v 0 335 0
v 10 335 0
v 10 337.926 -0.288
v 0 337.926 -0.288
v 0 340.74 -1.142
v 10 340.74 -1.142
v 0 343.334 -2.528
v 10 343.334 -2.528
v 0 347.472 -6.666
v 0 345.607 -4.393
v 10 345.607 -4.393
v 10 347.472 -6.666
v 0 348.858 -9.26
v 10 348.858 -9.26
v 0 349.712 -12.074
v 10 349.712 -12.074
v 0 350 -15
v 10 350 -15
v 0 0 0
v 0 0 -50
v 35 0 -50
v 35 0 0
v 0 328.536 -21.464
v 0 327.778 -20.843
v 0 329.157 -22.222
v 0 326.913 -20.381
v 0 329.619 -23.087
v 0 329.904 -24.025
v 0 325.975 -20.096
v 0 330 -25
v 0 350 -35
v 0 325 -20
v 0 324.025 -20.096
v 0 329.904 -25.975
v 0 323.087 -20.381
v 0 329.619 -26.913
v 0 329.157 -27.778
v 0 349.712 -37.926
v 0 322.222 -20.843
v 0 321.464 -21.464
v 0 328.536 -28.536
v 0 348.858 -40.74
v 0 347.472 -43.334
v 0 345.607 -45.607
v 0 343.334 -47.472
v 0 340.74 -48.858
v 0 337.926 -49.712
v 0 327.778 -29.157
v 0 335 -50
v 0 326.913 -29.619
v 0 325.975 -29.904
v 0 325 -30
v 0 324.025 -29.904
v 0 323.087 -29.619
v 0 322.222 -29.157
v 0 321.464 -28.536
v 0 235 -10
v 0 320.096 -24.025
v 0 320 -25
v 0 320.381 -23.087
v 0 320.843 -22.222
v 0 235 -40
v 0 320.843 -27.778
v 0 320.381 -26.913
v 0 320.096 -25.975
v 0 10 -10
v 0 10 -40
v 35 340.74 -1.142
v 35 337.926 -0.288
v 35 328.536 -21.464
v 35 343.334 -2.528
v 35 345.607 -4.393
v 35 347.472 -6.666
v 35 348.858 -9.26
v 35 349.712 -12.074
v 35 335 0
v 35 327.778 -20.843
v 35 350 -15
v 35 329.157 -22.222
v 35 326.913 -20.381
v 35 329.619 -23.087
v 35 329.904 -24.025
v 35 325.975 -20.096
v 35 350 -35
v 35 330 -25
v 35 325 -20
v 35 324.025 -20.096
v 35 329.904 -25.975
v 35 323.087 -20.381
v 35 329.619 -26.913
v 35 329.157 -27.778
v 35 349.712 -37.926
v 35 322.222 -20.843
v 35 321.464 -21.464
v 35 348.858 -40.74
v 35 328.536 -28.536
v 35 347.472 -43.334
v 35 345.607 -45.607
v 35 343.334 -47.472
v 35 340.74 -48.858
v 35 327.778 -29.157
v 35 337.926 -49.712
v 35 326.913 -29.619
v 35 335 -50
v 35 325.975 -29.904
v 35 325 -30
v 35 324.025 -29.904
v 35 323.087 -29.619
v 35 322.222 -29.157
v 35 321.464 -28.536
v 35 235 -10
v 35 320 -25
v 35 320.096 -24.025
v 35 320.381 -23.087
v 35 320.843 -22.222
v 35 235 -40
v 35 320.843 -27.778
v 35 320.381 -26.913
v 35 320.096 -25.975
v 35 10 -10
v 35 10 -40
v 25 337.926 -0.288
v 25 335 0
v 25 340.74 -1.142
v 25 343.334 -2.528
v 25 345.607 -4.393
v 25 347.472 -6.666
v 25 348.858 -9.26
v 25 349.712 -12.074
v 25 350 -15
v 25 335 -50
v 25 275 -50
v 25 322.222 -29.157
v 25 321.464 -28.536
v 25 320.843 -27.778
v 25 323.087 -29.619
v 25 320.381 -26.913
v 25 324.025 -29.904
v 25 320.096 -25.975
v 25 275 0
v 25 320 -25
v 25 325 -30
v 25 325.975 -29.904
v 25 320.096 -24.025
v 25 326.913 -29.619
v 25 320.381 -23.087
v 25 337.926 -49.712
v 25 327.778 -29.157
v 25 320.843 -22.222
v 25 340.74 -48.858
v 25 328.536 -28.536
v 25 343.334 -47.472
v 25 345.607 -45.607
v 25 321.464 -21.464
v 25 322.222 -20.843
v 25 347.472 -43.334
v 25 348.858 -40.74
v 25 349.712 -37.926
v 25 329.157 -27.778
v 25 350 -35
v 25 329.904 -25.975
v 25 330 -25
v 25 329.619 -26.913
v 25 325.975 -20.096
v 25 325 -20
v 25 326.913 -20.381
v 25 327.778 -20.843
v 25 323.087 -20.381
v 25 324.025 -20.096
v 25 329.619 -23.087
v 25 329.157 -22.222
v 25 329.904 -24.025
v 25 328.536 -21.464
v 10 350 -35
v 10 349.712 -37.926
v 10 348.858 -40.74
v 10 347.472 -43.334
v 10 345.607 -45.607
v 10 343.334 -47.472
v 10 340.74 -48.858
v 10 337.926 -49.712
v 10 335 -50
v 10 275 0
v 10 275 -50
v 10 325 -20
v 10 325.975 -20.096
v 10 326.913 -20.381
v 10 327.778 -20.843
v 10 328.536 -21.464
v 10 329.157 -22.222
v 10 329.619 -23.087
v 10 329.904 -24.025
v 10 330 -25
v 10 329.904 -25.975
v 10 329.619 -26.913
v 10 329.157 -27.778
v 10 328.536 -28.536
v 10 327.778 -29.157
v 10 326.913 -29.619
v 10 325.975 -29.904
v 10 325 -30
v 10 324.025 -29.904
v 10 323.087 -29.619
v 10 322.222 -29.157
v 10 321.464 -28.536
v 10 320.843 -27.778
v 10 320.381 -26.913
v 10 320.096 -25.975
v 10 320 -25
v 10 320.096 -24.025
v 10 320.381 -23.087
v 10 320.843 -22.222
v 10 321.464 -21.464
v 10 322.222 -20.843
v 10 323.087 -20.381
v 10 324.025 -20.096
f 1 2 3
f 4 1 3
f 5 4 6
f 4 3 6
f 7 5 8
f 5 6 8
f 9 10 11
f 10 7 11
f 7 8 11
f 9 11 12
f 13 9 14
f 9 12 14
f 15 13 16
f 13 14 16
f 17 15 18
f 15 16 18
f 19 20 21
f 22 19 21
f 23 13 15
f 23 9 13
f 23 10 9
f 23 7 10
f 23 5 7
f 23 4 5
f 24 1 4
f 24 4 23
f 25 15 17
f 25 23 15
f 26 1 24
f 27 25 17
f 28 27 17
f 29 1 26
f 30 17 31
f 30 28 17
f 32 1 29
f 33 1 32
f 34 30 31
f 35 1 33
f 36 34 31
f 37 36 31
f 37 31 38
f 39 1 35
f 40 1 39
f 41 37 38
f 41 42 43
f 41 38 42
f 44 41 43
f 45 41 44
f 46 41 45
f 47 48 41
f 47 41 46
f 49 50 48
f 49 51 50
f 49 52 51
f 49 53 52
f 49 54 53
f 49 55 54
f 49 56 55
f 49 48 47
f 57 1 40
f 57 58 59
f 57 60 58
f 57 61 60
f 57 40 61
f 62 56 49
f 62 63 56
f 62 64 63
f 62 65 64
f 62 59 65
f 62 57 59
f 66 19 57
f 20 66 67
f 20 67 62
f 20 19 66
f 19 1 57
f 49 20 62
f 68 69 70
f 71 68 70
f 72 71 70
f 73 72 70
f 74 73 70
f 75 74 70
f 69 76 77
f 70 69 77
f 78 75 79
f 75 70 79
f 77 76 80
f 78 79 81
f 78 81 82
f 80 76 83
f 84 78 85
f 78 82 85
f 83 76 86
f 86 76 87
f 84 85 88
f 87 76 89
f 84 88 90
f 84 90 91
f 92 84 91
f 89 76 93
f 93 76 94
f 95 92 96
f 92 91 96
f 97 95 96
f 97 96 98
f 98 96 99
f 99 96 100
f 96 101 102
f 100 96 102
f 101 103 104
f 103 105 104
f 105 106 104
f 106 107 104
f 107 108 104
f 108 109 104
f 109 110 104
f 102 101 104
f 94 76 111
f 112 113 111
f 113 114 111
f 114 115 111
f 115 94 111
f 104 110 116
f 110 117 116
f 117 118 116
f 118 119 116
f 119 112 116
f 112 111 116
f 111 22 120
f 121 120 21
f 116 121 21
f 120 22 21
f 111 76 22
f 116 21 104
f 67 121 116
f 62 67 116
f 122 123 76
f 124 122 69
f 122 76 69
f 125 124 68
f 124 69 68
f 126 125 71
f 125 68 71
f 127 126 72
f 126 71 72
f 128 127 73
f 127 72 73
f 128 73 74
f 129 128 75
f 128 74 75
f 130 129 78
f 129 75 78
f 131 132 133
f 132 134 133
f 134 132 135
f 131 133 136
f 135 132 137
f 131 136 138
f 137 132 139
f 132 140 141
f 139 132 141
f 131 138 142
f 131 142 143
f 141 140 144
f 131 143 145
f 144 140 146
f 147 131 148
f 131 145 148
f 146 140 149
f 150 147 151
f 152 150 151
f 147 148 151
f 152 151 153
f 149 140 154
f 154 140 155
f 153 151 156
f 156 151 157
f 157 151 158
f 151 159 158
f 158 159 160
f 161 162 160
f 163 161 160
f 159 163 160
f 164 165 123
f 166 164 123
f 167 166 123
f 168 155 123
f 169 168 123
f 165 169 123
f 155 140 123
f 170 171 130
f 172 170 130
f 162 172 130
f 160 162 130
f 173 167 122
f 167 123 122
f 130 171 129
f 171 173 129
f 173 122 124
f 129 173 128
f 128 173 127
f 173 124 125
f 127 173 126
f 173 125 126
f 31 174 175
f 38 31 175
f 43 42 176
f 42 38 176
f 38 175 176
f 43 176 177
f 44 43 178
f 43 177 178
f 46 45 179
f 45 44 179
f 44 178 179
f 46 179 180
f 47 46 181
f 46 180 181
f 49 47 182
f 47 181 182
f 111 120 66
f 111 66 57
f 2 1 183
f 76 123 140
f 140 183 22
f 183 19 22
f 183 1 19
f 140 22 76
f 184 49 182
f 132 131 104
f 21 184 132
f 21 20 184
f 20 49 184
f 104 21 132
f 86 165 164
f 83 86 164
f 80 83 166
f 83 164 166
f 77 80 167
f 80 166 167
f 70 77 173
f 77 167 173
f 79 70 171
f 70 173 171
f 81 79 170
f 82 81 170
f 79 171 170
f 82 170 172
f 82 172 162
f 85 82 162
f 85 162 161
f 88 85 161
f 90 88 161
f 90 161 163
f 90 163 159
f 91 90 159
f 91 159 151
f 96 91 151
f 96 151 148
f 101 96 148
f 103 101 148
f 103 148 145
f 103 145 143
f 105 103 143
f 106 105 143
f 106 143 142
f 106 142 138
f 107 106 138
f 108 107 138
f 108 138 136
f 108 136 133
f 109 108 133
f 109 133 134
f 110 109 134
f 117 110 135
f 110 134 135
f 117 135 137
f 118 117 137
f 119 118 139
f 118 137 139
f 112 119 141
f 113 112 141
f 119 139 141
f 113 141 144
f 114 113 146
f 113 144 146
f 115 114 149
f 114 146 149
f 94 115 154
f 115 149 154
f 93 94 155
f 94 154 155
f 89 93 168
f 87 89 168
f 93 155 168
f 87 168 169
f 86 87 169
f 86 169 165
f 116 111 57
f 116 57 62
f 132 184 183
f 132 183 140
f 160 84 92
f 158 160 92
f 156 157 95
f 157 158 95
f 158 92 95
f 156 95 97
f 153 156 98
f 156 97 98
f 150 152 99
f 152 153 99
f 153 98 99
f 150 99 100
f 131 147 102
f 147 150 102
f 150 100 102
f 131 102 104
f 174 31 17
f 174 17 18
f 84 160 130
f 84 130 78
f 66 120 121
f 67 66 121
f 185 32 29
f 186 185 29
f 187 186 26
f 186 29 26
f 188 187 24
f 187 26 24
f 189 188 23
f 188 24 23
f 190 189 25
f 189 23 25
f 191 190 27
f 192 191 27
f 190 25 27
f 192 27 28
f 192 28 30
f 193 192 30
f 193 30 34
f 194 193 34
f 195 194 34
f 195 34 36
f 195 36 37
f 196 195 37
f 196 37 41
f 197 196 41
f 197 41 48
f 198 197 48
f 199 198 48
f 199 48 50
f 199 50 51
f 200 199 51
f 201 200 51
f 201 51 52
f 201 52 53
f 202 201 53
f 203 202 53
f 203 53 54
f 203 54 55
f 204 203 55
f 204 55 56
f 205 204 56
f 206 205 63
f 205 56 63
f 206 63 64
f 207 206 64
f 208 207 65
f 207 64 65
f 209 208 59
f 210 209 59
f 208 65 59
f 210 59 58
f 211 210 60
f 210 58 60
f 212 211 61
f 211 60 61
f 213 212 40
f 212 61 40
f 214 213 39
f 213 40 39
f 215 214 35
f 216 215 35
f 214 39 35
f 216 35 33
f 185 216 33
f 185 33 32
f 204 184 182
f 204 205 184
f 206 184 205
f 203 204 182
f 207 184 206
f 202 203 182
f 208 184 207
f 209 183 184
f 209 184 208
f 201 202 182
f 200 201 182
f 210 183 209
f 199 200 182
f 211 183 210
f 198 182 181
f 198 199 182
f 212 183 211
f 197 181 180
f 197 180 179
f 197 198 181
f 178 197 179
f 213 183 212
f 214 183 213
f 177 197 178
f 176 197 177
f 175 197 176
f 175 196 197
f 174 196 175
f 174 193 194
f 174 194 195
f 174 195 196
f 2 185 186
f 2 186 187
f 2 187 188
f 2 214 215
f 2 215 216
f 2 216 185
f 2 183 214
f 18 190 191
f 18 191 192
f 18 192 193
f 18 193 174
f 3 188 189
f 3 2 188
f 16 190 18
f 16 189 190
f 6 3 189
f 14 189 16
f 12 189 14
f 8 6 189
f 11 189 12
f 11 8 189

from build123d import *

# Parameters (mm, degrees)
SKETCH1_W           = 35
SKETCH1_H           = 50
BOSS_EXTRUDE1_DEPTH = 350
CUT_EXTRUDE1_DEPTH  = 350
SKETCH3_W           = 30
SKETCH3_H           = 225
CUT_EXTRUDE2_DEPTH  = 350
SKETCH4_W           = 15
SKETCH4_H           = 75
CUT_EXTRUDE3_DEPTH  = 350
SKETCH5_R           = 5
CUT_EXTRUDE4_DEPTH  = 356.28157847


with BuildPart() as part:
    # Sketch1 → Boss-Extrude1 (new body)
    with BuildSketch(Plane(origin=(0, 0, 0), x_dir=(1, 0, 0), z_dir=(0, 1, 0))):
        with Locations((17.5, 25)):
            Rectangle(SKETCH1_W, SKETCH1_H)
    extrude(amount=BOSS_EXTRUDE1_DEPTH)

    # Sketch2 → Cut-Extrude1 (cut)
    with BuildSketch(Plane(origin=(35, 0, 0), x_dir=(0, 0, -1), z_dir=(1, 0, 0))):
        with BuildLine():
            ThreePointArc((0, 335), (4.393398282, 345.606601718), (15, 350))
            Line((15, 350), (0, 350))
            Line((0, 350), (0, 335))
        make_face()
        with BuildLine():
            Line((50, 350), (35, 350))
            ThreePointArc((35, 350), (45.606601718, 345.606601718), (50, 335))
            Line((50, 335), (50, 350))
        make_face()
    extrude(amount=-CUT_EXTRUDE1_DEPTH, mode=Mode.SUBTRACT)

    # Sketch3 → Cut-Extrude2 (cut)
    with BuildSketch(Plane(origin=(35, 0, 0), x_dir=(0, 0, -1), z_dir=(1, 0, 0))):
        with Locations((25, 122.5)):
            Rectangle(SKETCH3_W, SKETCH3_H)
    extrude(amount=-CUT_EXTRUDE2_DEPTH, mode=Mode.SUBTRACT)

    # Sketch4 → Cut-Extrude3 (cut)
    with BuildSketch(Plane.XY):
        with Locations((17.5, 312.5)):
            Rectangle(SKETCH4_W, SKETCH4_H)
    extrude(amount=-CUT_EXTRUDE3_DEPTH, mode=Mode.SUBTRACT)

    # Sketch5 → Cut-Extrude4 (cut, through all)
    with BuildSketch(Plane.ZY):
        with Locations((-25, 325)):
            Circle(SKETCH5_R)
    extrude(amount=-CUT_EXTRUDE4_DEPTH, mode=Mode.SUBTRACT)


solid = part.part
